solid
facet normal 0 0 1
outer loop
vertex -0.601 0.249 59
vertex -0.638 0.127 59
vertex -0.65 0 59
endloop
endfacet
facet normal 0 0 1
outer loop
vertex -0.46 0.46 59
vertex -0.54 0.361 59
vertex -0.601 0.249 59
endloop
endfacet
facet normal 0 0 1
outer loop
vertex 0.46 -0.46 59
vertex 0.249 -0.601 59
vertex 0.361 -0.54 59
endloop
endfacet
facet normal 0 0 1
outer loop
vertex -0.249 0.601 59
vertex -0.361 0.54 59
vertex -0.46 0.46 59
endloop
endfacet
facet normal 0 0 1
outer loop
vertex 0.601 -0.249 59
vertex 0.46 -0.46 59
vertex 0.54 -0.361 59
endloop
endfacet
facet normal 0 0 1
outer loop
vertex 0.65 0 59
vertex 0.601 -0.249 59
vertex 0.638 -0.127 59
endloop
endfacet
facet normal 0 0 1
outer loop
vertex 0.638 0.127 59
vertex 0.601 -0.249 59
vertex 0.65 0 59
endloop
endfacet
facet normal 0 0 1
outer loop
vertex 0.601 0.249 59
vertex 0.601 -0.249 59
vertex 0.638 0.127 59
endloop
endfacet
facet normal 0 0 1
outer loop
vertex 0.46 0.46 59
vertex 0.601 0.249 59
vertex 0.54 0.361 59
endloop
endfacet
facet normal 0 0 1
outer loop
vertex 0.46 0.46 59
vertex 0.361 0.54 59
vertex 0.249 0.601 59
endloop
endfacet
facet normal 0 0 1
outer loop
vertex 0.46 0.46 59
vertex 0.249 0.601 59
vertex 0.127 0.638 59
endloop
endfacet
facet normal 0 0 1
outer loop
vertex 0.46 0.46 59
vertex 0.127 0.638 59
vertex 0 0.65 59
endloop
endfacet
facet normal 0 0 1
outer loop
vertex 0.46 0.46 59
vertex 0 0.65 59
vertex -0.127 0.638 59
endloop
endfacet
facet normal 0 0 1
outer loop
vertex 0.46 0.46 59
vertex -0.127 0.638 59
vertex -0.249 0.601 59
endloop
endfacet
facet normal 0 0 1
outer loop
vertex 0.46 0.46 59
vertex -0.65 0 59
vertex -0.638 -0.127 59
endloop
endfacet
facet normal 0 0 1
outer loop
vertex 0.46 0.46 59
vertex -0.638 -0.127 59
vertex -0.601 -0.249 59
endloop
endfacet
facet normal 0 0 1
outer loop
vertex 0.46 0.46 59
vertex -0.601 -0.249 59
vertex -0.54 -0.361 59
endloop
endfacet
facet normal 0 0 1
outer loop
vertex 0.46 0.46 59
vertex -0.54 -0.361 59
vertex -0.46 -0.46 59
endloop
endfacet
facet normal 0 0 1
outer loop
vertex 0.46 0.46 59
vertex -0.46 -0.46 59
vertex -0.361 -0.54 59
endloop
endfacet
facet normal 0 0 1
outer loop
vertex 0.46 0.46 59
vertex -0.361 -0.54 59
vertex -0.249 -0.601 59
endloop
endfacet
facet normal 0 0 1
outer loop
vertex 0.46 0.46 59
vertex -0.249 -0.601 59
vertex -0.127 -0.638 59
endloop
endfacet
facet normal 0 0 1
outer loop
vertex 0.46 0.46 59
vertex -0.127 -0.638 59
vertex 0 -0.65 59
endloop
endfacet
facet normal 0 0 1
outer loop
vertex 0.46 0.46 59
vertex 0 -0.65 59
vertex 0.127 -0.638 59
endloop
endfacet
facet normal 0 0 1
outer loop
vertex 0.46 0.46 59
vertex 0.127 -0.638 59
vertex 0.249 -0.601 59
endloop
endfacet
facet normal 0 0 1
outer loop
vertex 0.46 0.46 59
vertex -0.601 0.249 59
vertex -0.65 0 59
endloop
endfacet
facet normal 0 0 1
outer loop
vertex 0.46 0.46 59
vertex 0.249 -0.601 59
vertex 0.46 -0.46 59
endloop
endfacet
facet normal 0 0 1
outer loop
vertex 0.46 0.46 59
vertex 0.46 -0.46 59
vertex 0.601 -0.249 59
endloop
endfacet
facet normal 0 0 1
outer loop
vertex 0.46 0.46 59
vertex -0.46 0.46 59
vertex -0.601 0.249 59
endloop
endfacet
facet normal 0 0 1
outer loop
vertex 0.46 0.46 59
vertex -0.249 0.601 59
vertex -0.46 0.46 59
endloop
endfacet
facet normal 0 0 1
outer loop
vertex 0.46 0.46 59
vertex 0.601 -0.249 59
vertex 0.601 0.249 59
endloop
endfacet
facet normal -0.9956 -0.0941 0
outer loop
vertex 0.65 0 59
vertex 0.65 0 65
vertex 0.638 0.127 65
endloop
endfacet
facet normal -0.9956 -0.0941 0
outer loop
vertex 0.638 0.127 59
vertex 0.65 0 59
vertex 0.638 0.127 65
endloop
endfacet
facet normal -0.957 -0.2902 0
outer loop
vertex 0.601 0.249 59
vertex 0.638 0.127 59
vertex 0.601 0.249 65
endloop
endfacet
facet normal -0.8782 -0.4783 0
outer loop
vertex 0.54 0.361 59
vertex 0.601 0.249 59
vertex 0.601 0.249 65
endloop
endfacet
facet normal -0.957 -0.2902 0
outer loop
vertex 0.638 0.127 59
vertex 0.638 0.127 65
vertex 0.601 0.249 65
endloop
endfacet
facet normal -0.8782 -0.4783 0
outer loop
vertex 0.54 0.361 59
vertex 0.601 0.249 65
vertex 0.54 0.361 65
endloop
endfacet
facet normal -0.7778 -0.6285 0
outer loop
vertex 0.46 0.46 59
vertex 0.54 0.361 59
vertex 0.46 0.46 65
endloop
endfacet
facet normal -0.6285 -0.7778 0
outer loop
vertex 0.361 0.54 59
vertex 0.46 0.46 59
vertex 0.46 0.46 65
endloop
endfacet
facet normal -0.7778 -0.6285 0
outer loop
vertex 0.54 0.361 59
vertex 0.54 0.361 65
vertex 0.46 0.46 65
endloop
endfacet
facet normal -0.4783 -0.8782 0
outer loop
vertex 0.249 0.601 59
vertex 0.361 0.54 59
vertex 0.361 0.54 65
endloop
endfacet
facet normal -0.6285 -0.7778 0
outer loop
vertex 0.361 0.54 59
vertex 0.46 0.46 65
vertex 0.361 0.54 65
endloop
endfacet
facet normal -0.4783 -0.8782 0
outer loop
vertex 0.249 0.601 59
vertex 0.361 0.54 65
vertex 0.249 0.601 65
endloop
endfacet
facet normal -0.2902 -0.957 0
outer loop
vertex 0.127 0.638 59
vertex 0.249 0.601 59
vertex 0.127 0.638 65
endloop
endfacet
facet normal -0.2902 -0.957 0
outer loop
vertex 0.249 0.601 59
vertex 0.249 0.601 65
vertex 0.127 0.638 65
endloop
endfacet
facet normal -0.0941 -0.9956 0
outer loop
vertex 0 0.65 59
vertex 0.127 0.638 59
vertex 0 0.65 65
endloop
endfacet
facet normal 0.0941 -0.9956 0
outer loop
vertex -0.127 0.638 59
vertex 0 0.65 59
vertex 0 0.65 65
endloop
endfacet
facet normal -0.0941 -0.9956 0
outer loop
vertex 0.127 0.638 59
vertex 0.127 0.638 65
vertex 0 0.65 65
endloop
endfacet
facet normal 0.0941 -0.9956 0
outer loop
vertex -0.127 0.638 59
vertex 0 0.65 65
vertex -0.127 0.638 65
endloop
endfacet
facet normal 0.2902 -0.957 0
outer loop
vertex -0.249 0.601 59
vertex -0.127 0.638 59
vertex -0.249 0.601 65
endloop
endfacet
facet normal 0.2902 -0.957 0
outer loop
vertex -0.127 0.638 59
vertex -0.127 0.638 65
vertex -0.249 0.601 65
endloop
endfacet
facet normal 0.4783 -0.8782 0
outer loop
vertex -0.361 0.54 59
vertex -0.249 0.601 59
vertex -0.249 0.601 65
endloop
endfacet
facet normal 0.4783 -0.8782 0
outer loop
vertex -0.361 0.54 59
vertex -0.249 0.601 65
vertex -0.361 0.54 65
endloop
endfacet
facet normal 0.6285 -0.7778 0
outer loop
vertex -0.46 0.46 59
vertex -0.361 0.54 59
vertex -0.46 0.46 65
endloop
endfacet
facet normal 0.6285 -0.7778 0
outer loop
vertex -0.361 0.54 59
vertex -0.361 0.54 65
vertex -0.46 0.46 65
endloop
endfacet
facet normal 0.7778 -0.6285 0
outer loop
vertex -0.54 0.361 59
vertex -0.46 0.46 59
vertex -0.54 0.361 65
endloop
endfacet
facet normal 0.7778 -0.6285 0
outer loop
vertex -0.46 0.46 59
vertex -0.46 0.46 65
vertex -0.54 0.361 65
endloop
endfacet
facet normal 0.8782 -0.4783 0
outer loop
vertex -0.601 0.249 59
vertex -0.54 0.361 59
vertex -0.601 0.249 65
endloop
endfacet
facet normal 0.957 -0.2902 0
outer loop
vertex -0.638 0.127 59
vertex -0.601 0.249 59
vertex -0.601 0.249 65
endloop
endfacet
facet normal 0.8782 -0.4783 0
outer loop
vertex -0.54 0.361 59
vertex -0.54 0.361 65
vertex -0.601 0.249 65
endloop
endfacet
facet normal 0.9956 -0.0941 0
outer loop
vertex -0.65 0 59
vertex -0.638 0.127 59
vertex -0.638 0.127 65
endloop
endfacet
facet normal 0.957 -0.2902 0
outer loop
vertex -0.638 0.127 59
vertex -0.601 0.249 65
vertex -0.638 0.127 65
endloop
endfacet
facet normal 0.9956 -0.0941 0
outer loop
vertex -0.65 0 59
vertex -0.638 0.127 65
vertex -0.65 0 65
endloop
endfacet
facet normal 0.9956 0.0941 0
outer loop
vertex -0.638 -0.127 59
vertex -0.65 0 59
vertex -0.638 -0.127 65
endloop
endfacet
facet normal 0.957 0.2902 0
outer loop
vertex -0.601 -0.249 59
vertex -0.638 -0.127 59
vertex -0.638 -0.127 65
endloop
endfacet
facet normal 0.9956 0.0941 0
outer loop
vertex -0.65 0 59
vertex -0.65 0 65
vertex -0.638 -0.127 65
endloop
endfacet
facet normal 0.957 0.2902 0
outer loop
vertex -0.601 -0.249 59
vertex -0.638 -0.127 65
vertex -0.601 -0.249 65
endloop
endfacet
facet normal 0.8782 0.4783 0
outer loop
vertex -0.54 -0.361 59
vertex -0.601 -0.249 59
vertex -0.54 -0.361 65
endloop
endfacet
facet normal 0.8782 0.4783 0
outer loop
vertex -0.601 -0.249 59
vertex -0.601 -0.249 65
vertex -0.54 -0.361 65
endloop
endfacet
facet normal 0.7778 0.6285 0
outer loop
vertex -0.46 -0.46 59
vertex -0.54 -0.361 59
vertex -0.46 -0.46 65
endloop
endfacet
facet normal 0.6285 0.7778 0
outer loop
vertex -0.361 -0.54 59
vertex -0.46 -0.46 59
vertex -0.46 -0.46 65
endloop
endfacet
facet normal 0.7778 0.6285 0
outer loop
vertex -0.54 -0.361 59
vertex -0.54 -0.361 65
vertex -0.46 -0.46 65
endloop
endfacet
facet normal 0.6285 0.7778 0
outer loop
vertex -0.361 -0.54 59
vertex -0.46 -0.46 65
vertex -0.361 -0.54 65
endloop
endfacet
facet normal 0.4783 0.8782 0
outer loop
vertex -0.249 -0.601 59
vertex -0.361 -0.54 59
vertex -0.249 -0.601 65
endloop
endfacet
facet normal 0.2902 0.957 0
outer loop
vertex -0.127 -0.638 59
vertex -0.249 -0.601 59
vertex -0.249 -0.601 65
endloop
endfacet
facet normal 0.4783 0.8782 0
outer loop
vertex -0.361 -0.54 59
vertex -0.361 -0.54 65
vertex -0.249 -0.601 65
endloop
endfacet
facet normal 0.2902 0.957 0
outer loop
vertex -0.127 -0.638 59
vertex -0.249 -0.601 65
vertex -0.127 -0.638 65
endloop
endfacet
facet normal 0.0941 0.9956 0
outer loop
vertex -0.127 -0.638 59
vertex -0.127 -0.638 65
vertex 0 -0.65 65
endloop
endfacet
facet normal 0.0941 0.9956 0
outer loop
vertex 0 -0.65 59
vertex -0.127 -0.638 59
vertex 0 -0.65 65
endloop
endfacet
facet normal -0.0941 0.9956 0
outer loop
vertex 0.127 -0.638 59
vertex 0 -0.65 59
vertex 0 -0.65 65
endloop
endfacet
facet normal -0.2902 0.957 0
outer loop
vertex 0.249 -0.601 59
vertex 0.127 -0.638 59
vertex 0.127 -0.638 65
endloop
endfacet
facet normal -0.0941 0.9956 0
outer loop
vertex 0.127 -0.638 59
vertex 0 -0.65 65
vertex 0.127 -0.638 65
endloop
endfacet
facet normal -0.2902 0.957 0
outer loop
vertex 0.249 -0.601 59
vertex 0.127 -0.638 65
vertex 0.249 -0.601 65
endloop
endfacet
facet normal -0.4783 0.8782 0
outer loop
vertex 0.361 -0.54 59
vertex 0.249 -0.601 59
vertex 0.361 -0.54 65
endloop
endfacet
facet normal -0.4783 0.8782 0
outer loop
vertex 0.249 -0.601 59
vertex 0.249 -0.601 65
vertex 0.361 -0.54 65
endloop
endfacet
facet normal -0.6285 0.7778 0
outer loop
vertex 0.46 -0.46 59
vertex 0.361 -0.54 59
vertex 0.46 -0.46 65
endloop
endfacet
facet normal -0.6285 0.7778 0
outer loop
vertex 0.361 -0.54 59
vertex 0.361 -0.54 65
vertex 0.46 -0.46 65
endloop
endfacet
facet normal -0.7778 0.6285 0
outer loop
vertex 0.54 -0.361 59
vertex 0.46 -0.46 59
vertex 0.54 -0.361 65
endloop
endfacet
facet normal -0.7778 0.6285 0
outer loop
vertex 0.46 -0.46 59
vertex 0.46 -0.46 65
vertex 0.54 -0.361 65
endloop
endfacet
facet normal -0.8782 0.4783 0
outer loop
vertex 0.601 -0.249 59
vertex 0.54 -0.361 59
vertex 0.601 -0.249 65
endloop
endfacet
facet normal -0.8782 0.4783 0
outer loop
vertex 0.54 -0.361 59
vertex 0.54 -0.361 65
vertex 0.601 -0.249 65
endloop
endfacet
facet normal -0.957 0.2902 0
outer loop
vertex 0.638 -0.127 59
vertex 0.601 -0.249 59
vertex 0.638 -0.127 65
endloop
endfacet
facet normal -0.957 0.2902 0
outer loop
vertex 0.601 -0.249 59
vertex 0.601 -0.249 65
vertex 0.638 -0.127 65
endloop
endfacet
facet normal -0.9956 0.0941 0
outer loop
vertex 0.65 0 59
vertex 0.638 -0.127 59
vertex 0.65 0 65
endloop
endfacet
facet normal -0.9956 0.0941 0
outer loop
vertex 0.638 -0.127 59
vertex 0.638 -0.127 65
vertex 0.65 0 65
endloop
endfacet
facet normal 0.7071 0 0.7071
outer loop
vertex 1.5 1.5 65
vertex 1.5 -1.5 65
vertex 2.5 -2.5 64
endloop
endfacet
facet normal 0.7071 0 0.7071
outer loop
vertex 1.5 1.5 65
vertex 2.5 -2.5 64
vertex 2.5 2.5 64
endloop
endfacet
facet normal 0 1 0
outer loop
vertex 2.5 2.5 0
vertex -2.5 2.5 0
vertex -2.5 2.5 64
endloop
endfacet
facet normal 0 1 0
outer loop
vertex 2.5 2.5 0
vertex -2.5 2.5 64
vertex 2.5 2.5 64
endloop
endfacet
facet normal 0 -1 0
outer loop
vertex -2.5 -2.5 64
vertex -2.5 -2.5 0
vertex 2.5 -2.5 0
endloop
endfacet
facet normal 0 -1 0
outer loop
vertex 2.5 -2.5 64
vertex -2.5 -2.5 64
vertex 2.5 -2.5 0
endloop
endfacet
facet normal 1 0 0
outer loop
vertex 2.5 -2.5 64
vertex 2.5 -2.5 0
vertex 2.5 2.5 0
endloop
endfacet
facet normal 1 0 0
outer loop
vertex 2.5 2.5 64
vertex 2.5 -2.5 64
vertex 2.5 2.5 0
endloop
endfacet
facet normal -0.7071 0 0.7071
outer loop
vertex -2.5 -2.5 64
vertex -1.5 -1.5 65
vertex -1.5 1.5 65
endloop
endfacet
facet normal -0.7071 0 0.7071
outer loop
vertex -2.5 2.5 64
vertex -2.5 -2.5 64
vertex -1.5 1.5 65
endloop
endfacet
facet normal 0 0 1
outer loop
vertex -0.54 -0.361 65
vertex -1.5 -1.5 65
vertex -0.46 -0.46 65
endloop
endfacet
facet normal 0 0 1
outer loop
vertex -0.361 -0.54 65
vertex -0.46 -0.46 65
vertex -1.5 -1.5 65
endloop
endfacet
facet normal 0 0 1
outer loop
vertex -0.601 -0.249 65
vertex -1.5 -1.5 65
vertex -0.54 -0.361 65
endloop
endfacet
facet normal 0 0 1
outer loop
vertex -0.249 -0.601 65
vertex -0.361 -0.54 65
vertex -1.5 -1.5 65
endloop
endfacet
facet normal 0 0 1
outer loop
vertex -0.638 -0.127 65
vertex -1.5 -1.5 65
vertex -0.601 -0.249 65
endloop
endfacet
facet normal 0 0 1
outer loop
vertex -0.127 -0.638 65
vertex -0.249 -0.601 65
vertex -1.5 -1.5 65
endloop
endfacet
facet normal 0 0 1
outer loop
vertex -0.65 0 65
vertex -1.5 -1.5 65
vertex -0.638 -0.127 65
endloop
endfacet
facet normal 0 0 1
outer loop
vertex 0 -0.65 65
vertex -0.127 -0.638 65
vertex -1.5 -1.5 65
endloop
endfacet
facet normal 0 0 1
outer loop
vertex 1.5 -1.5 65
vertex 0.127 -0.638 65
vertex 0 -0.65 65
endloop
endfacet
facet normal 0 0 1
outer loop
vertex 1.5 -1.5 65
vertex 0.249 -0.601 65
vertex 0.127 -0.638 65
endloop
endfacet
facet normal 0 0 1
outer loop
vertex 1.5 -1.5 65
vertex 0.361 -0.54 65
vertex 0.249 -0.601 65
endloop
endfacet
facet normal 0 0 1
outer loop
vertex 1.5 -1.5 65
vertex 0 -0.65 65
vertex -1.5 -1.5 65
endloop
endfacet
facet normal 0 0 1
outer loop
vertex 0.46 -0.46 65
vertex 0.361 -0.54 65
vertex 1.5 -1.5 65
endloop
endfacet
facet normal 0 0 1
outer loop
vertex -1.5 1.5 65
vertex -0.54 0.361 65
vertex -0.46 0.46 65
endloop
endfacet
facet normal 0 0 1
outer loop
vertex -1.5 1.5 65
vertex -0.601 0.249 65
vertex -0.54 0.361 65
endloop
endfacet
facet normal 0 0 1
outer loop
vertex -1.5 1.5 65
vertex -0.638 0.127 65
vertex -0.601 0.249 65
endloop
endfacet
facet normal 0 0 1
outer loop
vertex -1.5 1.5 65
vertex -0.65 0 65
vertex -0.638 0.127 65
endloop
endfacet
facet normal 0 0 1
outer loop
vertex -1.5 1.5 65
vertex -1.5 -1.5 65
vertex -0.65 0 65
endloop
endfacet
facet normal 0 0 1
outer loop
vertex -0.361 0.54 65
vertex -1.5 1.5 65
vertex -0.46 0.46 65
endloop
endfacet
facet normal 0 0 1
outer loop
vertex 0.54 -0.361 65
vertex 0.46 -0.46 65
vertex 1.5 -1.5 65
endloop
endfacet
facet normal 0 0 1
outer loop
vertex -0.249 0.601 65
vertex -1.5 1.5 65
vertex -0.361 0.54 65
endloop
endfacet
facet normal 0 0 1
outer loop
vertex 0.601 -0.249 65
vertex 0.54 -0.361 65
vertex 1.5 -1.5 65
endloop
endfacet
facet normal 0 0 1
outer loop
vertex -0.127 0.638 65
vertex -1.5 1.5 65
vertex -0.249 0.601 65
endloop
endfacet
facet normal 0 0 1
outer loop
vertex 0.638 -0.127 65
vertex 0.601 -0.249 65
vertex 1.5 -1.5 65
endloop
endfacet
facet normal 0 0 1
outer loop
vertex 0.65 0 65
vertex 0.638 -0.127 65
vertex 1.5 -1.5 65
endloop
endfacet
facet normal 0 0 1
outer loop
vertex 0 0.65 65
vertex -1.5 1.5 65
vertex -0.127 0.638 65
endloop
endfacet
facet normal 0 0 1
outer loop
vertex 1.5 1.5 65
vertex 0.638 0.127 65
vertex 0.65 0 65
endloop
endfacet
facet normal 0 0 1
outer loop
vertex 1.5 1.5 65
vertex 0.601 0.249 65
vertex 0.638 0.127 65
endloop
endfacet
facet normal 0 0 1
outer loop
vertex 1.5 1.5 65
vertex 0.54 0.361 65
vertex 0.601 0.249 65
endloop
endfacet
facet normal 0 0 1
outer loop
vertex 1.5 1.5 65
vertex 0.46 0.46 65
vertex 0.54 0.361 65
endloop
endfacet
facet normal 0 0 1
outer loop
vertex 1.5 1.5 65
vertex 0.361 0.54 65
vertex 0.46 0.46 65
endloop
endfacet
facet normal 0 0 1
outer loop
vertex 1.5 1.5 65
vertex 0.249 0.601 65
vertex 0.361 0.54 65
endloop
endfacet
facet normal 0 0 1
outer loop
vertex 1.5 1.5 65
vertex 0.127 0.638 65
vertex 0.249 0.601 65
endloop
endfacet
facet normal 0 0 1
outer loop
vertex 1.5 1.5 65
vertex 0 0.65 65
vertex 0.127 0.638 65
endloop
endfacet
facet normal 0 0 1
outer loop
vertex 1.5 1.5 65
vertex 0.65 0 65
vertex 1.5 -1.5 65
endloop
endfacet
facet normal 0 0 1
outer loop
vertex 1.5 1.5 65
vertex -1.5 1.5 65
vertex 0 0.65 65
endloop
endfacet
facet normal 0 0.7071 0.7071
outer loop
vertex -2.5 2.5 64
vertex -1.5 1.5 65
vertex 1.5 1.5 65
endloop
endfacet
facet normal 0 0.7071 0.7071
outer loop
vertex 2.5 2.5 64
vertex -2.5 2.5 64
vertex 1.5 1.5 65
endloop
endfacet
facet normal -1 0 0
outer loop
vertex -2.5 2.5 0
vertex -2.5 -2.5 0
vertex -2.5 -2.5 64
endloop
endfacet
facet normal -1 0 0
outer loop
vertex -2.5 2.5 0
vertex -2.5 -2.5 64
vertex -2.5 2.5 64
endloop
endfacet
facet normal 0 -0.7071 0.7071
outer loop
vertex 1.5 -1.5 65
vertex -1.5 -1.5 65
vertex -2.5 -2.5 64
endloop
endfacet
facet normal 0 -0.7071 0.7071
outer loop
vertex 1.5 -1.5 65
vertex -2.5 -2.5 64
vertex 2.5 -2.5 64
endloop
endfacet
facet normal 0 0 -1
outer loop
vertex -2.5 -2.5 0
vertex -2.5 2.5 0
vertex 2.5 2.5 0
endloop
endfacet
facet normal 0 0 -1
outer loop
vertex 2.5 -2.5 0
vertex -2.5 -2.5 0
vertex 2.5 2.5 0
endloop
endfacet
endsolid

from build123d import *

# Parameters (mm, degrees)
F0_W     = 5
F0_H     = 5
F1_DEPTH = 65
F2_SIZE  = 1
F3_R     = 0.65
F4_DEPTH = 6


with BuildPart() as f1:
    # F0 (on Top) → F1 (new body)
    with BuildSketch(Plane.XY):
        Rectangle(F0_W, F0_H)
    extrude(amount=F1_DEPTH)

    # F2
    f2_edges = [f1.edges().sort_by_distance(p)[0] for p in [
        (0, -2.5, 65),
        (2.5, 0, 65),
        (0, 2.5, 65),
        (-2.5, 0, 65),
    ]]
    chamfer(f2_edges, length=F2_SIZE)

    # F3 (on face) → F4 (cut)
    with BuildSketch(Plane.XY.offset(65)):
        Circle(F3_R)
    extrude(amount=-F4_DEPTH, mode=Mode.SUBTRACT)


solid = f1.part
